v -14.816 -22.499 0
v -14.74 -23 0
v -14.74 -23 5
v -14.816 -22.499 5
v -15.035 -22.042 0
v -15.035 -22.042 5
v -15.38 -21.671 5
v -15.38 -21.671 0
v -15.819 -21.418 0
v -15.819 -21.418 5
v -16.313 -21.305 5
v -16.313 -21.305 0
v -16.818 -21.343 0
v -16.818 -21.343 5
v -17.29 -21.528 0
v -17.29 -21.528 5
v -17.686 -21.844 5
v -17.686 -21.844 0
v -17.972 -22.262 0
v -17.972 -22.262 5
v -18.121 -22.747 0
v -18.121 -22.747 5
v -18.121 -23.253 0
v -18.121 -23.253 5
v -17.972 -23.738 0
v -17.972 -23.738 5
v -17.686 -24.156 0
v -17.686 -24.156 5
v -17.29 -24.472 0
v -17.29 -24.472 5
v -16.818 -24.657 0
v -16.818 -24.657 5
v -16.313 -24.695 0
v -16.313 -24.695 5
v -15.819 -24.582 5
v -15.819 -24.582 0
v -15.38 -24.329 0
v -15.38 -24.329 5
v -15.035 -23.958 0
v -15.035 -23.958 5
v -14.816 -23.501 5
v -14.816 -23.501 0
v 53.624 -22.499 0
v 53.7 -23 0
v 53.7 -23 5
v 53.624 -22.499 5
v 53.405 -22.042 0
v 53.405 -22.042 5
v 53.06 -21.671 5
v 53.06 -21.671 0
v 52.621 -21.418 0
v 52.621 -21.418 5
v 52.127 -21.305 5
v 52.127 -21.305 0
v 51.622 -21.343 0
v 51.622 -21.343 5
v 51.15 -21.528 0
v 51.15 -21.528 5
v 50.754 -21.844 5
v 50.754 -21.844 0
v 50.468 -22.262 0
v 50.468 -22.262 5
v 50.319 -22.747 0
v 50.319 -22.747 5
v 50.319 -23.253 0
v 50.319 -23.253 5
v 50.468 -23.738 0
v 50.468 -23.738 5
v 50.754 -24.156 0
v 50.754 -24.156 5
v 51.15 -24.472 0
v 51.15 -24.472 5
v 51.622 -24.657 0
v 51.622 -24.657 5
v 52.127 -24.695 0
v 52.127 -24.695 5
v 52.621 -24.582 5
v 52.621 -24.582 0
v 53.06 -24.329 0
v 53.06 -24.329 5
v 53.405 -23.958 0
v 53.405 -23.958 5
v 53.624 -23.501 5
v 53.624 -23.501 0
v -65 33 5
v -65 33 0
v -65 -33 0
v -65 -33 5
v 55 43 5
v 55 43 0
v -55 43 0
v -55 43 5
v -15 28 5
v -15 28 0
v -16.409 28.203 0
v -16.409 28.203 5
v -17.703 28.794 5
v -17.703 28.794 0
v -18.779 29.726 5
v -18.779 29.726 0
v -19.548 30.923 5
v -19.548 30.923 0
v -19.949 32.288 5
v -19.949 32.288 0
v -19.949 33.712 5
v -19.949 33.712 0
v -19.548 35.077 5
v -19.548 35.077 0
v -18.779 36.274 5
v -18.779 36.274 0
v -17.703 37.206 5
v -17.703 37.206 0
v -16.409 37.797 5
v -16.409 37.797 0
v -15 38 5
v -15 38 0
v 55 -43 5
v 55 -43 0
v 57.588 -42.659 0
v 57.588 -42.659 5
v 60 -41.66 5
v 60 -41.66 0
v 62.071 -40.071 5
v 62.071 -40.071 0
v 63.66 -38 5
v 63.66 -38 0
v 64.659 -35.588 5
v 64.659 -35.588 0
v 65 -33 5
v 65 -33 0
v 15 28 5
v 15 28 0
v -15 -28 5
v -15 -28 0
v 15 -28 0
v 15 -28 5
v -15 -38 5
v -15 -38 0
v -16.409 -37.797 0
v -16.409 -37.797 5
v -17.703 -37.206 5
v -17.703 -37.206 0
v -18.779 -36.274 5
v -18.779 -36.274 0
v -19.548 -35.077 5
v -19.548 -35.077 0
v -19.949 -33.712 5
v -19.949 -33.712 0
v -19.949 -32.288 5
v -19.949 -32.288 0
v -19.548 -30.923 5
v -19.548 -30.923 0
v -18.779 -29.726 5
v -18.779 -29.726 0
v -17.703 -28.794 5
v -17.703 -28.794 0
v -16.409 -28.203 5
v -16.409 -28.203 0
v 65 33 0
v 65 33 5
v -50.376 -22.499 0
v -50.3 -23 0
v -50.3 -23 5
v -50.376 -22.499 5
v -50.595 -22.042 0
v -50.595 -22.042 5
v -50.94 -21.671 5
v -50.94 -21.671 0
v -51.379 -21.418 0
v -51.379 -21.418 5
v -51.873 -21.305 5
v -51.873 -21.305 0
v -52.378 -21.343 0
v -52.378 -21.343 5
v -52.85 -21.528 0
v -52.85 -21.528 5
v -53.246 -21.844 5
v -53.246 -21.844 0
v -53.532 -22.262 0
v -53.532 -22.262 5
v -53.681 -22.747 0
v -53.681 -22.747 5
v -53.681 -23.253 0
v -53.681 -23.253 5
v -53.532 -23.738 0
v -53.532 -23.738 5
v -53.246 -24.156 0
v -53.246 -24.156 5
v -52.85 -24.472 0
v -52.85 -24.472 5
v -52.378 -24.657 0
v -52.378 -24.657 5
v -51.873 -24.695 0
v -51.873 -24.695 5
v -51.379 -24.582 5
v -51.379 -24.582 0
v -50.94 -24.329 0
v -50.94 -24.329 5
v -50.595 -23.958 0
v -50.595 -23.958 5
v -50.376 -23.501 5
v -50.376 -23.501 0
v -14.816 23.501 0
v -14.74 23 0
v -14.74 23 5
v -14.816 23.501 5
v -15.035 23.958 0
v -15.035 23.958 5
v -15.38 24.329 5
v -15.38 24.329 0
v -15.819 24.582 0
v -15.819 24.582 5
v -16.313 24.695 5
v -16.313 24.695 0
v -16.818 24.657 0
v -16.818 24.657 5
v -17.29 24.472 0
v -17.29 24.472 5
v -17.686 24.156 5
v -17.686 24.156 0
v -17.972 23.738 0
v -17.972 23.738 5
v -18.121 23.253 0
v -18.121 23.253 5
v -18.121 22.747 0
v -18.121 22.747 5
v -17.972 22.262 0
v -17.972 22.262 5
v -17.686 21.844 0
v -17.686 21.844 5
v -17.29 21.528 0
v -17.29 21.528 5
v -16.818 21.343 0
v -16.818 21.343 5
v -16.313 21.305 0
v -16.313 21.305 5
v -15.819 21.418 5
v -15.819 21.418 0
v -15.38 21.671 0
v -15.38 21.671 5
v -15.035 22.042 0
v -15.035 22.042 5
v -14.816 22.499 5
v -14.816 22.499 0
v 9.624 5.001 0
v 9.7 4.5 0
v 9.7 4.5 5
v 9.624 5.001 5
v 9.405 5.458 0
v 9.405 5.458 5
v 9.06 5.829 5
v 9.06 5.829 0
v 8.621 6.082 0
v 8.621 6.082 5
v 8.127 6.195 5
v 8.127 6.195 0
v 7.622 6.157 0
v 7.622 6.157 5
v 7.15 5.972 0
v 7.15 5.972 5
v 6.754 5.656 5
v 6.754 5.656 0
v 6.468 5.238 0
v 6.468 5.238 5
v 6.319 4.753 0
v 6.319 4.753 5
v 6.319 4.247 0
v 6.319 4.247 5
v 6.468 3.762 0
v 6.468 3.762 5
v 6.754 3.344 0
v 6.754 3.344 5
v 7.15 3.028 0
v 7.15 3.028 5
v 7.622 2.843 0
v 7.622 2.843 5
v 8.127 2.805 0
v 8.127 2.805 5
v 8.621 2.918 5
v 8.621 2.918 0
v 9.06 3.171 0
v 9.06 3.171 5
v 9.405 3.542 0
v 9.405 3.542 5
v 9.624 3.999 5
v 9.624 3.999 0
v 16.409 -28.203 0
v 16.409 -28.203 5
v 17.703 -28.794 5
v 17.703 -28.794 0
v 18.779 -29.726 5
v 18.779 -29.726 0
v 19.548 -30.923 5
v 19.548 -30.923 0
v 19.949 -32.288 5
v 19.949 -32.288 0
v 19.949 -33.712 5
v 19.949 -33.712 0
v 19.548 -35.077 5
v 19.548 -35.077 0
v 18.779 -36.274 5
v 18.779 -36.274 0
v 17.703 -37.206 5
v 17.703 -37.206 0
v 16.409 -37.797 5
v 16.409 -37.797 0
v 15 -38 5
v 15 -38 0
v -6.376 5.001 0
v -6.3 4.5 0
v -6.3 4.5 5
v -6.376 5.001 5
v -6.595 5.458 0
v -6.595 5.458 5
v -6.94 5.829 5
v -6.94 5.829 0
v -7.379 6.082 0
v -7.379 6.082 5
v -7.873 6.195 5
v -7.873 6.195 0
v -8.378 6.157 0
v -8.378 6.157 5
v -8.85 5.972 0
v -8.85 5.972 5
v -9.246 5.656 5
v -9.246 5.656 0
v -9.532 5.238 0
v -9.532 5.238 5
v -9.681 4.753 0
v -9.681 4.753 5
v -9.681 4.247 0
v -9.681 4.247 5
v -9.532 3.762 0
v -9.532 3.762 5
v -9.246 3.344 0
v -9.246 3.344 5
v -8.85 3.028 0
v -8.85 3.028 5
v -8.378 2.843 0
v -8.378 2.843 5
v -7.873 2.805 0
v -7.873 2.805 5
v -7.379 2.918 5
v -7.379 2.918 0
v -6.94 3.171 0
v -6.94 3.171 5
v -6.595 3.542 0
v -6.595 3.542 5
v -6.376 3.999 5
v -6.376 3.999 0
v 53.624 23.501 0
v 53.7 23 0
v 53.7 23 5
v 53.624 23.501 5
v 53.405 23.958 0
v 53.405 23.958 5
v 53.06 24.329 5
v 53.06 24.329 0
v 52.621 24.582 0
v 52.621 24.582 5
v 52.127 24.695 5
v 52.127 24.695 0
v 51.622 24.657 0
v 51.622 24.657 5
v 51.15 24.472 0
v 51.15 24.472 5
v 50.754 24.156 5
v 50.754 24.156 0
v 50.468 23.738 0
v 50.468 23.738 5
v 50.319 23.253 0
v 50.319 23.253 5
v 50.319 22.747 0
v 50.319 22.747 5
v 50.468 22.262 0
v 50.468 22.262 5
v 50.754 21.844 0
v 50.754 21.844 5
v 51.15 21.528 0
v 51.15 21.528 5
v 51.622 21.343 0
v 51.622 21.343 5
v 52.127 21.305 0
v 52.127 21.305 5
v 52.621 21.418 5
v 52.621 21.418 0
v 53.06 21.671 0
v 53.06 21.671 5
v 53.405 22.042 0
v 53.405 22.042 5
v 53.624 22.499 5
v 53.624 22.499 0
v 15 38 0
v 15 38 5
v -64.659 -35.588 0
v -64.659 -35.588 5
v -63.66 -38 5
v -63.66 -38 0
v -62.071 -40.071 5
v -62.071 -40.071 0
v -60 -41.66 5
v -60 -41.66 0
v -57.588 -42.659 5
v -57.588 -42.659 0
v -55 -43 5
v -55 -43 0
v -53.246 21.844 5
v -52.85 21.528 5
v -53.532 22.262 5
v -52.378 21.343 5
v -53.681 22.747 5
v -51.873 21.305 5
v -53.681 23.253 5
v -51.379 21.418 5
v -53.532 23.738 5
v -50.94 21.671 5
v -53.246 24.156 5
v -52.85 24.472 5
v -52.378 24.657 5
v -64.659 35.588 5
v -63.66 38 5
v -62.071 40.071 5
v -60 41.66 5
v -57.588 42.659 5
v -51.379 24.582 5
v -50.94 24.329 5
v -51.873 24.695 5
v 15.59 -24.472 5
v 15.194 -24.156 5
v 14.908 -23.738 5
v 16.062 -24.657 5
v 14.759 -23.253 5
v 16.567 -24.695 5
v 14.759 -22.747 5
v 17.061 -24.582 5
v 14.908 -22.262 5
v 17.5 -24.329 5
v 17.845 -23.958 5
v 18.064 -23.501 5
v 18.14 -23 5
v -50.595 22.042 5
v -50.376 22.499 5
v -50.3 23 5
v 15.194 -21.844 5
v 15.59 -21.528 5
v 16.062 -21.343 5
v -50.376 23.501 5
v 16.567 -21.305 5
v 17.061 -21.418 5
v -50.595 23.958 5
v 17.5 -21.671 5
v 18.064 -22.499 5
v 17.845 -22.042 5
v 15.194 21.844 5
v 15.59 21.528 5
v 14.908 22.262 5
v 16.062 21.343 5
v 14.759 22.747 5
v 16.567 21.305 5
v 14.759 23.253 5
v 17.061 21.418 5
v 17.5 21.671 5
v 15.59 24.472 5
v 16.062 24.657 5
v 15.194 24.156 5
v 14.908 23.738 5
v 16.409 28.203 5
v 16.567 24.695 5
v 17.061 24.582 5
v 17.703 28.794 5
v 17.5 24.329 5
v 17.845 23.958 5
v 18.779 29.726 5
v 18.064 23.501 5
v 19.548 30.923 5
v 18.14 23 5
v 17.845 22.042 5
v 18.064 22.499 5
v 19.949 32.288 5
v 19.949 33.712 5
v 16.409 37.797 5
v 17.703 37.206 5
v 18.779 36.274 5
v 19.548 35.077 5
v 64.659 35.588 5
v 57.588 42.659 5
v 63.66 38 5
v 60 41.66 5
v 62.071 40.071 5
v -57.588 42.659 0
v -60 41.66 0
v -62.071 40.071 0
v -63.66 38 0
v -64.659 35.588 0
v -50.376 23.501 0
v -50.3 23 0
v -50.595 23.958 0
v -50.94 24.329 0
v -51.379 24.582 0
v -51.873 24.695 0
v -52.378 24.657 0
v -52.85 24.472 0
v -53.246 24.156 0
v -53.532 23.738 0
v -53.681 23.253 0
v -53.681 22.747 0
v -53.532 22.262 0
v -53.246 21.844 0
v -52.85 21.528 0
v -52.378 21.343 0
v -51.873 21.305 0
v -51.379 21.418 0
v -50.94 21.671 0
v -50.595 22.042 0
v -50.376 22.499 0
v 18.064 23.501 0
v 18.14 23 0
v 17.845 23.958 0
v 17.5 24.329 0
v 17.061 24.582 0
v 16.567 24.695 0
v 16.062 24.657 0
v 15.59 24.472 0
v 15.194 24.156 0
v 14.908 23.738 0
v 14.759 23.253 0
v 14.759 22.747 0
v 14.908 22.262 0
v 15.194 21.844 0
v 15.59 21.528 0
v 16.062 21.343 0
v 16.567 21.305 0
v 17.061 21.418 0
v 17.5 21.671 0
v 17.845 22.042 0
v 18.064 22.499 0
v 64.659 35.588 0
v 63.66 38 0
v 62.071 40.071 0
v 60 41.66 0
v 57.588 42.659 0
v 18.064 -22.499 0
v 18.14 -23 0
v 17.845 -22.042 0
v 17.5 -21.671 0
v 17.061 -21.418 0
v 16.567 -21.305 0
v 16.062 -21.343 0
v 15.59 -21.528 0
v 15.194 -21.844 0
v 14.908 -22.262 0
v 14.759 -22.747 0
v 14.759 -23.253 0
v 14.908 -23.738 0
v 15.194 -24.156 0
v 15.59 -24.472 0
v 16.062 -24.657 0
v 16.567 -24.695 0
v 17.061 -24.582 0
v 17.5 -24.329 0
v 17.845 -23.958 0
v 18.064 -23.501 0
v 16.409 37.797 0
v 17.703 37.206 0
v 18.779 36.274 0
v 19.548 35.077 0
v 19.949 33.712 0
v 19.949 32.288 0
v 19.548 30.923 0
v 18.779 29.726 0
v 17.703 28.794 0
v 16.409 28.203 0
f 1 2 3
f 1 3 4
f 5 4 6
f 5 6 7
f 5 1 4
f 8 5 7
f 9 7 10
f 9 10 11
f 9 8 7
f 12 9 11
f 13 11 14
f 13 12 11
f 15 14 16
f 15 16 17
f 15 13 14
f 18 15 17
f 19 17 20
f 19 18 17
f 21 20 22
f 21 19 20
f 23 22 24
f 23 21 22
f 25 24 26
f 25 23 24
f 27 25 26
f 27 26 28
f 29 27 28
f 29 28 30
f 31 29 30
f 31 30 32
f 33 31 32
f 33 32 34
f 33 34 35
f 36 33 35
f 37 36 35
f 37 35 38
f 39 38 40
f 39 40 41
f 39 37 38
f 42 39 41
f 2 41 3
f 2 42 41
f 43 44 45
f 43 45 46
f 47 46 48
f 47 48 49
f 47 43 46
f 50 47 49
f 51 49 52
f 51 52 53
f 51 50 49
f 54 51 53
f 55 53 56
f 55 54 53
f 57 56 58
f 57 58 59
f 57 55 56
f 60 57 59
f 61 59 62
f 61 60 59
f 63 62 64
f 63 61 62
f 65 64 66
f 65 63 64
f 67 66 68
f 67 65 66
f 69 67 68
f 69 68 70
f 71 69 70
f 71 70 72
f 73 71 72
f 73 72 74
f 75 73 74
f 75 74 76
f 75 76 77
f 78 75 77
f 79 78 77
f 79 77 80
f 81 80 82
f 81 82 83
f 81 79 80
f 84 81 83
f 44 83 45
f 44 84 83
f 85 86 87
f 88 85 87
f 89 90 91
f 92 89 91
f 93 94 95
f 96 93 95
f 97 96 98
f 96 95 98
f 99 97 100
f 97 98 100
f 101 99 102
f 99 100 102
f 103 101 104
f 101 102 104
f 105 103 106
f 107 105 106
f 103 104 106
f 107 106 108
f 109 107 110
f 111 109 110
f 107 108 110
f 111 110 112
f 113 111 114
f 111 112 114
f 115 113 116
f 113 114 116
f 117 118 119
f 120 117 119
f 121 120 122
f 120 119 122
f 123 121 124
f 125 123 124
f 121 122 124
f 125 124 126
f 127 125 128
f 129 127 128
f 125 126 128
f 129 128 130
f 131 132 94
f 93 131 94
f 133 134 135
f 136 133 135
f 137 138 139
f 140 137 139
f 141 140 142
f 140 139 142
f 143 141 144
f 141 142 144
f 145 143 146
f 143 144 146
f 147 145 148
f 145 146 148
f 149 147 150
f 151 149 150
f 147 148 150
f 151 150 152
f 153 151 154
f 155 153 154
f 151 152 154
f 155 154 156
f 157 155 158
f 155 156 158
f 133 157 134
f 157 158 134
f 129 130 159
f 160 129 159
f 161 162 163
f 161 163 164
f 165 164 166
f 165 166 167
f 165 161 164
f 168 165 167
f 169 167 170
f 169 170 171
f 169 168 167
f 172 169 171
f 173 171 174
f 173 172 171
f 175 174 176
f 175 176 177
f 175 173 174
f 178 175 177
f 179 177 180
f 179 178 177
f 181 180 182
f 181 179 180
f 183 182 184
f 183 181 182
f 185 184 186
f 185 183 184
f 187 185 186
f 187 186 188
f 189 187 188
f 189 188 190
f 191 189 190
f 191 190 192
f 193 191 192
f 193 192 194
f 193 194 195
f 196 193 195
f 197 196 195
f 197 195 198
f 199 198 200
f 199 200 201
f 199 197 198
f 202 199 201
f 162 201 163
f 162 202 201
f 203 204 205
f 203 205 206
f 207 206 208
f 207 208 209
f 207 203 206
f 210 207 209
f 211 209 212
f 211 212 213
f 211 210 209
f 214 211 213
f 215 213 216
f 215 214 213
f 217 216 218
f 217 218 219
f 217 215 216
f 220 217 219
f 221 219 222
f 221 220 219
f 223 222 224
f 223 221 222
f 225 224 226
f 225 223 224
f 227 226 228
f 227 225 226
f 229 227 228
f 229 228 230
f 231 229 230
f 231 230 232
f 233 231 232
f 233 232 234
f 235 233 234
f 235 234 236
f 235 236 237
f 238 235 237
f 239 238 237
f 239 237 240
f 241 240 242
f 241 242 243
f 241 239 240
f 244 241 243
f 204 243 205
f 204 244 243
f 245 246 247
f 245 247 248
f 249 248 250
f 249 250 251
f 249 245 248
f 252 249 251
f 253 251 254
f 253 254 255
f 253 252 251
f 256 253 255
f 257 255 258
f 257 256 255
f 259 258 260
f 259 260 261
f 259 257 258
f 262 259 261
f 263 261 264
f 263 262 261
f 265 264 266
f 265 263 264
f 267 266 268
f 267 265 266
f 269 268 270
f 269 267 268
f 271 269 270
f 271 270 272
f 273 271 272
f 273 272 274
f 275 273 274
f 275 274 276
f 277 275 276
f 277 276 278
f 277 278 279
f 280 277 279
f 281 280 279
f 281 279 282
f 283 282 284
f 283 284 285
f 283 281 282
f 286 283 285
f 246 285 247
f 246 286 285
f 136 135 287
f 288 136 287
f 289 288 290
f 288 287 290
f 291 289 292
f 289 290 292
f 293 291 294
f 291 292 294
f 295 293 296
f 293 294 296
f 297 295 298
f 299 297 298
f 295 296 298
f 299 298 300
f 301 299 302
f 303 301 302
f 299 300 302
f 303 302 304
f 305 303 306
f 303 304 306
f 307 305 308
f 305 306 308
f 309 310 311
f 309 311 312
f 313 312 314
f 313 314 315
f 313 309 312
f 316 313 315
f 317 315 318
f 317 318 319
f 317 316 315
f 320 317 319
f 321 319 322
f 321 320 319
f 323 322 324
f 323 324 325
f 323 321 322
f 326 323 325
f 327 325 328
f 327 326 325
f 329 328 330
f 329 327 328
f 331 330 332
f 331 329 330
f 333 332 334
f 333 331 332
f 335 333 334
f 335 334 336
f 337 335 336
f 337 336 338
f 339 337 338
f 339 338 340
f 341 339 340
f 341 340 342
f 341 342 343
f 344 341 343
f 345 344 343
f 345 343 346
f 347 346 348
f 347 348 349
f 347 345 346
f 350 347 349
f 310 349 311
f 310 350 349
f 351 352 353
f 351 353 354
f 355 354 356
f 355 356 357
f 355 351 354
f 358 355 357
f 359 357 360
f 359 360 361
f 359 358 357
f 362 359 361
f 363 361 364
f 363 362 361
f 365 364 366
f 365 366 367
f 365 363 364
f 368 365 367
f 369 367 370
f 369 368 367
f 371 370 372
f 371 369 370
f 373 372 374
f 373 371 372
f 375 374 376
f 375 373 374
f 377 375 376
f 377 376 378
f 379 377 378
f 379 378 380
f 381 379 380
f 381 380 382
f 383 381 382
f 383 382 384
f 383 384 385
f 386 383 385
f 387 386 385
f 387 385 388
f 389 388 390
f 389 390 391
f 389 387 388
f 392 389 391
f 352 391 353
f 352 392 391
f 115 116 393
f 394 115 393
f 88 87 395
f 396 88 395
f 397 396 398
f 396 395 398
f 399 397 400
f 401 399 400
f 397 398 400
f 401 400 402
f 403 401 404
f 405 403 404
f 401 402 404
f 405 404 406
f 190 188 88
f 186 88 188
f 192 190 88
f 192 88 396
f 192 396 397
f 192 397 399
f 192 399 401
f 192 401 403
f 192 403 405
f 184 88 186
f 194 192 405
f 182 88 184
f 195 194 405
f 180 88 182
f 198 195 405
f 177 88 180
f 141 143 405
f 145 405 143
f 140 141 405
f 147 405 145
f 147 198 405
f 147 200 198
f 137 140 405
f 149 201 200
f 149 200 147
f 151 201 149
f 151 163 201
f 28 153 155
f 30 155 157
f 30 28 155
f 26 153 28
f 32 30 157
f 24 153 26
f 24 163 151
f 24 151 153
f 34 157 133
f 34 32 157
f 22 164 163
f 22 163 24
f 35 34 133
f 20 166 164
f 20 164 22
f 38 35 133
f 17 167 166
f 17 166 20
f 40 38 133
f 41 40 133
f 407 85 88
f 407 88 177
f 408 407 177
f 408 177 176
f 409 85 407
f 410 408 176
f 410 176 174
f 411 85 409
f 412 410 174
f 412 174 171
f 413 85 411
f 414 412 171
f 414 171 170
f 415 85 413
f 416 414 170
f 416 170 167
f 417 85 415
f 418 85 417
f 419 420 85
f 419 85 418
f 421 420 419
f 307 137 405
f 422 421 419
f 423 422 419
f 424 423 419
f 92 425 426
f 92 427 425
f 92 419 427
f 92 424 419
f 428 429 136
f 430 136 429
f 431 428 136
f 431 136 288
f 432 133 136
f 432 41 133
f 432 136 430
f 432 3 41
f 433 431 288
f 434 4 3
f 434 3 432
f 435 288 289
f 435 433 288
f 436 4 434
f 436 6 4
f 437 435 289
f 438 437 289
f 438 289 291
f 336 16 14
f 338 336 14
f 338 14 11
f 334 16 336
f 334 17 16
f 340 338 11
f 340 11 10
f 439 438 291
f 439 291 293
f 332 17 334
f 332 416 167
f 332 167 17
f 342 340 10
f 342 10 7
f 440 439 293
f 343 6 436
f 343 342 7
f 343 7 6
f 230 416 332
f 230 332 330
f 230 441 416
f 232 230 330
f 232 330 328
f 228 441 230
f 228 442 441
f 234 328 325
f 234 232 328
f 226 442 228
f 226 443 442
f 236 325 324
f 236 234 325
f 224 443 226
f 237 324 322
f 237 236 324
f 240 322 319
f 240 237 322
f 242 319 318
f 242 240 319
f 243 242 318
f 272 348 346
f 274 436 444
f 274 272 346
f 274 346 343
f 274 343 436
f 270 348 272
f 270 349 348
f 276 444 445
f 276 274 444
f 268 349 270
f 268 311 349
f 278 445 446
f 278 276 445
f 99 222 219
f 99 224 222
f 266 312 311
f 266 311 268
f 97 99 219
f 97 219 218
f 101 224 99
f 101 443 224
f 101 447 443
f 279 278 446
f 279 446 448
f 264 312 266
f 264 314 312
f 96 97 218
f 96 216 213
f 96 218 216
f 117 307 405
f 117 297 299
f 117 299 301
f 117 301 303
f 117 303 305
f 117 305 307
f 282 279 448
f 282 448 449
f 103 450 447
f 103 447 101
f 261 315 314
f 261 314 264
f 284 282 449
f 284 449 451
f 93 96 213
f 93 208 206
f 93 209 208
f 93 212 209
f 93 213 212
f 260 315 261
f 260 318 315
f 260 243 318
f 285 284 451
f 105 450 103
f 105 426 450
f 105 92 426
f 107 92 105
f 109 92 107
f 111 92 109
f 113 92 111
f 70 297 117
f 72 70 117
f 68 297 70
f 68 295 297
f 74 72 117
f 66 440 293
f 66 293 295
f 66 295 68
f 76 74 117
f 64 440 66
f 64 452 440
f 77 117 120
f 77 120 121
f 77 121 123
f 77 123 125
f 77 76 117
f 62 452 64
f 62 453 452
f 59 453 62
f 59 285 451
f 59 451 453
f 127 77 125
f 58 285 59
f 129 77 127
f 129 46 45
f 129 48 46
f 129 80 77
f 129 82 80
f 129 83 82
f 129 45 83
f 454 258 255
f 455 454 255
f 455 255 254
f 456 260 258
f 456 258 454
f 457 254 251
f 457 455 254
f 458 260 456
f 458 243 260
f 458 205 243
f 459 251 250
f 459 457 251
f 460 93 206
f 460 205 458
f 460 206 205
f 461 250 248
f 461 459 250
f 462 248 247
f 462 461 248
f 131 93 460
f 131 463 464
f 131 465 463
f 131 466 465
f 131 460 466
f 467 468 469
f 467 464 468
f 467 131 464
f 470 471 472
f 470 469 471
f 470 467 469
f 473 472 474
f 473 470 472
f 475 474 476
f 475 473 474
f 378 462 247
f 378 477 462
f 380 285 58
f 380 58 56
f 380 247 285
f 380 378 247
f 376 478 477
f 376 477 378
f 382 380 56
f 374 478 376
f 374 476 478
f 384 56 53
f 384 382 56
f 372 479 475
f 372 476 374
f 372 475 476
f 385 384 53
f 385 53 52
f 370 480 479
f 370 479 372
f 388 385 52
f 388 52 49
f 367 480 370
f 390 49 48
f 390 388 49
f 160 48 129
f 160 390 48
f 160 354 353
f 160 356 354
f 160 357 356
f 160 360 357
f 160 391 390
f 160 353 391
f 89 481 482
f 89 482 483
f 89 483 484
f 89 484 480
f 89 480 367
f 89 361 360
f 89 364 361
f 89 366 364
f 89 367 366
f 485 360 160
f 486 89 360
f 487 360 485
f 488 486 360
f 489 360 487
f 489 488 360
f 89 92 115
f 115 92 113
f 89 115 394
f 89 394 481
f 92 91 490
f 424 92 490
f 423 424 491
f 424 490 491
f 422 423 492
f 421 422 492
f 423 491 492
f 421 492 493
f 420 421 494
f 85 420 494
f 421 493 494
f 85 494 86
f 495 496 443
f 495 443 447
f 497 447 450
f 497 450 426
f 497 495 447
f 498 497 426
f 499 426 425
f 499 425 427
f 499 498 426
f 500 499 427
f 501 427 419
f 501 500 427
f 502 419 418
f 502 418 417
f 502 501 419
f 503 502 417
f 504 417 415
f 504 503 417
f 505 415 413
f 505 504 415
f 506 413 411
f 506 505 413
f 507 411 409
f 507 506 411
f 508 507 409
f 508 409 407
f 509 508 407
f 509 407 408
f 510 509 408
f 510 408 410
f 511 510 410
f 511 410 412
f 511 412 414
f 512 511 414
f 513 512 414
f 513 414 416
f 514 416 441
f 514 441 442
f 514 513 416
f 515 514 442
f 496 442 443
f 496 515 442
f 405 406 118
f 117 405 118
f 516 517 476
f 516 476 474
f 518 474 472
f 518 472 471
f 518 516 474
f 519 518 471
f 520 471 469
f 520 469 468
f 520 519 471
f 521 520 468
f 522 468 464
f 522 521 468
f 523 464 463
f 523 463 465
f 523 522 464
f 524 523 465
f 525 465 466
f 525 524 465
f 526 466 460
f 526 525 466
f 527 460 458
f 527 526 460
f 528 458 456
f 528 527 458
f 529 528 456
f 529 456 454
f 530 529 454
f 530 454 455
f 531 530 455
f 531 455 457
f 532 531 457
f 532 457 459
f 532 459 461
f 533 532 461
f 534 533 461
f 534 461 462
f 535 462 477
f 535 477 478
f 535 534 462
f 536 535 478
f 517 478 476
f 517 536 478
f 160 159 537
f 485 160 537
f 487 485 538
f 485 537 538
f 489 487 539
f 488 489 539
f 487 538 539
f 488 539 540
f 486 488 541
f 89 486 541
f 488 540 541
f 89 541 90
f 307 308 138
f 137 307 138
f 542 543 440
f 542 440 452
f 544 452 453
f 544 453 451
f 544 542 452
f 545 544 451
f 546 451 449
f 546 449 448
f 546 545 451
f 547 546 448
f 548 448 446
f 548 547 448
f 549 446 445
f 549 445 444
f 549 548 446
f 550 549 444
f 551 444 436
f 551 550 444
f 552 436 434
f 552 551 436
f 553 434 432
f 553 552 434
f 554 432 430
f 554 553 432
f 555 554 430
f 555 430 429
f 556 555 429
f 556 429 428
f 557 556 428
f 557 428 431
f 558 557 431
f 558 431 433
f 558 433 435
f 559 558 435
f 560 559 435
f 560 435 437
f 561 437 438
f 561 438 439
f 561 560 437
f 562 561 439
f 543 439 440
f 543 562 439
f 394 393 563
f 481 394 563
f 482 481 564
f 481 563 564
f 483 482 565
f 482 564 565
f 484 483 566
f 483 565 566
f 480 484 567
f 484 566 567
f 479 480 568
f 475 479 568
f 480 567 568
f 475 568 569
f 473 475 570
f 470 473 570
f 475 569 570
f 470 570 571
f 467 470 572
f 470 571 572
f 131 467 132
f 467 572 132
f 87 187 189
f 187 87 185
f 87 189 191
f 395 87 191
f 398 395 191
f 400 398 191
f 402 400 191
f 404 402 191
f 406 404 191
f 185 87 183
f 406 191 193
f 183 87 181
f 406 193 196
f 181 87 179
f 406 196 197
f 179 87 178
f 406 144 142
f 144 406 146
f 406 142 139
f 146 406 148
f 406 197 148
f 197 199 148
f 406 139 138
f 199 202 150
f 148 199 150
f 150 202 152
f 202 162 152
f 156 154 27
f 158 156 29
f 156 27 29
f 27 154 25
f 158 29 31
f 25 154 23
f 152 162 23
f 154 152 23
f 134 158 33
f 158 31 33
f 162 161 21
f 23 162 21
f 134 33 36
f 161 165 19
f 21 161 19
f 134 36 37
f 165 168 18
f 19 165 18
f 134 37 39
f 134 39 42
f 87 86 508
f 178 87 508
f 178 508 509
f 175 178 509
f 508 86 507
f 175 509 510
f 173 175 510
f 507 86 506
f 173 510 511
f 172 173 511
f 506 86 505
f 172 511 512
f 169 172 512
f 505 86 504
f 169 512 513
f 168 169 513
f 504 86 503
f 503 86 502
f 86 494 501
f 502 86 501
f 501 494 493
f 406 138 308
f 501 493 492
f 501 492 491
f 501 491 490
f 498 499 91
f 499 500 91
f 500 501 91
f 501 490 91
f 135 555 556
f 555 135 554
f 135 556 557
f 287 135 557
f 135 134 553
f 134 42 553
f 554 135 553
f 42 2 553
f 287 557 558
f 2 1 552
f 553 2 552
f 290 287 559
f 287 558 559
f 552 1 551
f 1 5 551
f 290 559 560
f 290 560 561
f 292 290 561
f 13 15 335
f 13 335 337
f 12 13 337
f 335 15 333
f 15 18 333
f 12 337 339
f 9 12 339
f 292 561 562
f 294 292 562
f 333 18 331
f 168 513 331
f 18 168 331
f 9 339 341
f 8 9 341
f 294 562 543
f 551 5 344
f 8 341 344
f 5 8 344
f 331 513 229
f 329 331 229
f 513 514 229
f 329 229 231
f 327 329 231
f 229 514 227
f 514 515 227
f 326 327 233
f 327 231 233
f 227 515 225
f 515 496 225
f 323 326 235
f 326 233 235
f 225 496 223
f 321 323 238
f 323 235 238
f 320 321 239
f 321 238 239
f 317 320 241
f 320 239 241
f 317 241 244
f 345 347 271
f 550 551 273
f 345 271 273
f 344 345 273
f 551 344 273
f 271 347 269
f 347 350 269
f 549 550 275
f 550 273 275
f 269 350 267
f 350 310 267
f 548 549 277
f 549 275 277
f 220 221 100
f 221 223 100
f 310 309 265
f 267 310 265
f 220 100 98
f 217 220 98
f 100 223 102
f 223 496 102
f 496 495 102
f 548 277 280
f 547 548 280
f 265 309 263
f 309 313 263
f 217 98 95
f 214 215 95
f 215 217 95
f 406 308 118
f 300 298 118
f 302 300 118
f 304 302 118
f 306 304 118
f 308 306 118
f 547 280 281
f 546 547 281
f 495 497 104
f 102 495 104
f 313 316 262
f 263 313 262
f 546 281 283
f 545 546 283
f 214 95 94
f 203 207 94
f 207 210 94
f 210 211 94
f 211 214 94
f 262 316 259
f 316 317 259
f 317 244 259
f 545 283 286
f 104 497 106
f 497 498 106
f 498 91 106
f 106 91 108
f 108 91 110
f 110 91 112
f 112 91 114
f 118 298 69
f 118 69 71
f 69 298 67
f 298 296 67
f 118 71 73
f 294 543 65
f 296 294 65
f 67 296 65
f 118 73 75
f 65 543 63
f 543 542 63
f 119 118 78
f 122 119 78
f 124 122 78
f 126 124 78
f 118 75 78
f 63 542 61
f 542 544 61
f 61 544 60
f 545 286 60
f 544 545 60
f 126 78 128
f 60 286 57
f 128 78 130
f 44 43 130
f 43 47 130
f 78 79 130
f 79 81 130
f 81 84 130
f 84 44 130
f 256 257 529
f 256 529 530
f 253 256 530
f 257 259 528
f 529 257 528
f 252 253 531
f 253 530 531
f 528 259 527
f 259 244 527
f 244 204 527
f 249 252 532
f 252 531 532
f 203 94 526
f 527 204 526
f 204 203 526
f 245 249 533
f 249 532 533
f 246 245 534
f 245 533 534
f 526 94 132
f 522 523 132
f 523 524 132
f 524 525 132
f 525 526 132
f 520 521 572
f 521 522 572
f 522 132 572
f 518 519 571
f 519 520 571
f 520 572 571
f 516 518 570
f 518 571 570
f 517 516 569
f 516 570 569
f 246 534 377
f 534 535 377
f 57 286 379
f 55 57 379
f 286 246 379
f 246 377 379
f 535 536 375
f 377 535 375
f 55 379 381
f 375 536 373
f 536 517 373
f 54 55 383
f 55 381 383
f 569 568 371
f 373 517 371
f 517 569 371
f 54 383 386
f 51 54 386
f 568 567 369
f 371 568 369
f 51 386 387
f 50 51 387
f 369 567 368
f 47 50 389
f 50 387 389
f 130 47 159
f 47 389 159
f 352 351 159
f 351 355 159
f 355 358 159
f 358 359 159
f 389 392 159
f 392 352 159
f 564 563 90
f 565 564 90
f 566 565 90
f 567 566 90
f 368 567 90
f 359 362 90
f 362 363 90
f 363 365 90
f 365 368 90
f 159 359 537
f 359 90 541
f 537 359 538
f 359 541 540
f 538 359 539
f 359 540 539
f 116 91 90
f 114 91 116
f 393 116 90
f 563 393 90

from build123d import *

# Parameters (mm, degrees)
SKETCH1_R           = 1.7
BOSS_EXTRUDE1_DEPTH = 5


with BuildPart() as part:
    # Sketch1 → Boss-Extrude1 (new body)
    with BuildSketch(Plane.XY):
        with BuildLine():
            ThreePointArc((-55, 43), (-62.071067812, 40.071067812), (-65, 33))
            Line((-65, 33), (-65, -33))
            ThreePointArc((-65, -33), (-62.071067812, -40.071067812), (-55, -43))
            Line((-55, -43), (55, -43))
            ThreePointArc((55, -43), (62.071067812, -40.071067812), (65, -33))
            Line((65, -33), (65, 33))
            ThreePointArc((65, 33), (62.071067812, 40.071067812), (55, 43))
            Line((55, 43), (-55, 43))
        make_face()
        with Locations((52, -23)):
            Circle(SKETCH1_R, mode=Mode.SUBTRACT)
        with Locations((-52, -23)):
            Circle(SKETCH1_R, mode=Mode.SUBTRACT)
        with Locations((52, 23)):
            Circle(SKETCH1_R, mode=Mode.SUBTRACT)
        with Locations((-52, 23)):
            Circle(SKETCH1_R, mode=Mode.SUBTRACT)
        with BuildLine():
            ThreePointArc((15, 38), (20, 33), (15, 28))
            Line((15, 28), (-15, 28))
            ThreePointArc((-15, 28), (-20, 33), (-15, 38))
            Line((-15, 38), (15, 38))
        make_face(mode=Mode.SUBTRACT)
        with Locations((-16.44, -23)):
            Circle(SKETCH1_R, mode=Mode.SUBTRACT)
        with BuildLine():
            ThreePointArc((-15, -38), (-20, -33), (-15, -28))
            Line((-15, -28), (15, -28))
            ThreePointArc((15, -28), (20, -33), (15, -38))
            Line((15, -38), (-15, -38))
        make_face(mode=Mode.SUBTRACT)
        with Locations((16.44, -23)):
            Circle(SKETCH1_R, mode=Mode.SUBTRACT)
        with Locations((-8, 4.5)):
            Circle(SKETCH1_R, mode=Mode.SUBTRACT)
        with Locations((-16.44, 23)):
            Circle(SKETCH1_R, mode=Mode.SUBTRACT)
        with Locations((8, 4.5)):
            Circle(SKETCH1_R, mode=Mode.SUBTRACT)
        with Locations((16.44, 23)):
            Circle(SKETCH1_R, mode=Mode.SUBTRACT)
    extrude(amount=BOSS_EXTRUDE1_DEPTH)


solid = part.part
